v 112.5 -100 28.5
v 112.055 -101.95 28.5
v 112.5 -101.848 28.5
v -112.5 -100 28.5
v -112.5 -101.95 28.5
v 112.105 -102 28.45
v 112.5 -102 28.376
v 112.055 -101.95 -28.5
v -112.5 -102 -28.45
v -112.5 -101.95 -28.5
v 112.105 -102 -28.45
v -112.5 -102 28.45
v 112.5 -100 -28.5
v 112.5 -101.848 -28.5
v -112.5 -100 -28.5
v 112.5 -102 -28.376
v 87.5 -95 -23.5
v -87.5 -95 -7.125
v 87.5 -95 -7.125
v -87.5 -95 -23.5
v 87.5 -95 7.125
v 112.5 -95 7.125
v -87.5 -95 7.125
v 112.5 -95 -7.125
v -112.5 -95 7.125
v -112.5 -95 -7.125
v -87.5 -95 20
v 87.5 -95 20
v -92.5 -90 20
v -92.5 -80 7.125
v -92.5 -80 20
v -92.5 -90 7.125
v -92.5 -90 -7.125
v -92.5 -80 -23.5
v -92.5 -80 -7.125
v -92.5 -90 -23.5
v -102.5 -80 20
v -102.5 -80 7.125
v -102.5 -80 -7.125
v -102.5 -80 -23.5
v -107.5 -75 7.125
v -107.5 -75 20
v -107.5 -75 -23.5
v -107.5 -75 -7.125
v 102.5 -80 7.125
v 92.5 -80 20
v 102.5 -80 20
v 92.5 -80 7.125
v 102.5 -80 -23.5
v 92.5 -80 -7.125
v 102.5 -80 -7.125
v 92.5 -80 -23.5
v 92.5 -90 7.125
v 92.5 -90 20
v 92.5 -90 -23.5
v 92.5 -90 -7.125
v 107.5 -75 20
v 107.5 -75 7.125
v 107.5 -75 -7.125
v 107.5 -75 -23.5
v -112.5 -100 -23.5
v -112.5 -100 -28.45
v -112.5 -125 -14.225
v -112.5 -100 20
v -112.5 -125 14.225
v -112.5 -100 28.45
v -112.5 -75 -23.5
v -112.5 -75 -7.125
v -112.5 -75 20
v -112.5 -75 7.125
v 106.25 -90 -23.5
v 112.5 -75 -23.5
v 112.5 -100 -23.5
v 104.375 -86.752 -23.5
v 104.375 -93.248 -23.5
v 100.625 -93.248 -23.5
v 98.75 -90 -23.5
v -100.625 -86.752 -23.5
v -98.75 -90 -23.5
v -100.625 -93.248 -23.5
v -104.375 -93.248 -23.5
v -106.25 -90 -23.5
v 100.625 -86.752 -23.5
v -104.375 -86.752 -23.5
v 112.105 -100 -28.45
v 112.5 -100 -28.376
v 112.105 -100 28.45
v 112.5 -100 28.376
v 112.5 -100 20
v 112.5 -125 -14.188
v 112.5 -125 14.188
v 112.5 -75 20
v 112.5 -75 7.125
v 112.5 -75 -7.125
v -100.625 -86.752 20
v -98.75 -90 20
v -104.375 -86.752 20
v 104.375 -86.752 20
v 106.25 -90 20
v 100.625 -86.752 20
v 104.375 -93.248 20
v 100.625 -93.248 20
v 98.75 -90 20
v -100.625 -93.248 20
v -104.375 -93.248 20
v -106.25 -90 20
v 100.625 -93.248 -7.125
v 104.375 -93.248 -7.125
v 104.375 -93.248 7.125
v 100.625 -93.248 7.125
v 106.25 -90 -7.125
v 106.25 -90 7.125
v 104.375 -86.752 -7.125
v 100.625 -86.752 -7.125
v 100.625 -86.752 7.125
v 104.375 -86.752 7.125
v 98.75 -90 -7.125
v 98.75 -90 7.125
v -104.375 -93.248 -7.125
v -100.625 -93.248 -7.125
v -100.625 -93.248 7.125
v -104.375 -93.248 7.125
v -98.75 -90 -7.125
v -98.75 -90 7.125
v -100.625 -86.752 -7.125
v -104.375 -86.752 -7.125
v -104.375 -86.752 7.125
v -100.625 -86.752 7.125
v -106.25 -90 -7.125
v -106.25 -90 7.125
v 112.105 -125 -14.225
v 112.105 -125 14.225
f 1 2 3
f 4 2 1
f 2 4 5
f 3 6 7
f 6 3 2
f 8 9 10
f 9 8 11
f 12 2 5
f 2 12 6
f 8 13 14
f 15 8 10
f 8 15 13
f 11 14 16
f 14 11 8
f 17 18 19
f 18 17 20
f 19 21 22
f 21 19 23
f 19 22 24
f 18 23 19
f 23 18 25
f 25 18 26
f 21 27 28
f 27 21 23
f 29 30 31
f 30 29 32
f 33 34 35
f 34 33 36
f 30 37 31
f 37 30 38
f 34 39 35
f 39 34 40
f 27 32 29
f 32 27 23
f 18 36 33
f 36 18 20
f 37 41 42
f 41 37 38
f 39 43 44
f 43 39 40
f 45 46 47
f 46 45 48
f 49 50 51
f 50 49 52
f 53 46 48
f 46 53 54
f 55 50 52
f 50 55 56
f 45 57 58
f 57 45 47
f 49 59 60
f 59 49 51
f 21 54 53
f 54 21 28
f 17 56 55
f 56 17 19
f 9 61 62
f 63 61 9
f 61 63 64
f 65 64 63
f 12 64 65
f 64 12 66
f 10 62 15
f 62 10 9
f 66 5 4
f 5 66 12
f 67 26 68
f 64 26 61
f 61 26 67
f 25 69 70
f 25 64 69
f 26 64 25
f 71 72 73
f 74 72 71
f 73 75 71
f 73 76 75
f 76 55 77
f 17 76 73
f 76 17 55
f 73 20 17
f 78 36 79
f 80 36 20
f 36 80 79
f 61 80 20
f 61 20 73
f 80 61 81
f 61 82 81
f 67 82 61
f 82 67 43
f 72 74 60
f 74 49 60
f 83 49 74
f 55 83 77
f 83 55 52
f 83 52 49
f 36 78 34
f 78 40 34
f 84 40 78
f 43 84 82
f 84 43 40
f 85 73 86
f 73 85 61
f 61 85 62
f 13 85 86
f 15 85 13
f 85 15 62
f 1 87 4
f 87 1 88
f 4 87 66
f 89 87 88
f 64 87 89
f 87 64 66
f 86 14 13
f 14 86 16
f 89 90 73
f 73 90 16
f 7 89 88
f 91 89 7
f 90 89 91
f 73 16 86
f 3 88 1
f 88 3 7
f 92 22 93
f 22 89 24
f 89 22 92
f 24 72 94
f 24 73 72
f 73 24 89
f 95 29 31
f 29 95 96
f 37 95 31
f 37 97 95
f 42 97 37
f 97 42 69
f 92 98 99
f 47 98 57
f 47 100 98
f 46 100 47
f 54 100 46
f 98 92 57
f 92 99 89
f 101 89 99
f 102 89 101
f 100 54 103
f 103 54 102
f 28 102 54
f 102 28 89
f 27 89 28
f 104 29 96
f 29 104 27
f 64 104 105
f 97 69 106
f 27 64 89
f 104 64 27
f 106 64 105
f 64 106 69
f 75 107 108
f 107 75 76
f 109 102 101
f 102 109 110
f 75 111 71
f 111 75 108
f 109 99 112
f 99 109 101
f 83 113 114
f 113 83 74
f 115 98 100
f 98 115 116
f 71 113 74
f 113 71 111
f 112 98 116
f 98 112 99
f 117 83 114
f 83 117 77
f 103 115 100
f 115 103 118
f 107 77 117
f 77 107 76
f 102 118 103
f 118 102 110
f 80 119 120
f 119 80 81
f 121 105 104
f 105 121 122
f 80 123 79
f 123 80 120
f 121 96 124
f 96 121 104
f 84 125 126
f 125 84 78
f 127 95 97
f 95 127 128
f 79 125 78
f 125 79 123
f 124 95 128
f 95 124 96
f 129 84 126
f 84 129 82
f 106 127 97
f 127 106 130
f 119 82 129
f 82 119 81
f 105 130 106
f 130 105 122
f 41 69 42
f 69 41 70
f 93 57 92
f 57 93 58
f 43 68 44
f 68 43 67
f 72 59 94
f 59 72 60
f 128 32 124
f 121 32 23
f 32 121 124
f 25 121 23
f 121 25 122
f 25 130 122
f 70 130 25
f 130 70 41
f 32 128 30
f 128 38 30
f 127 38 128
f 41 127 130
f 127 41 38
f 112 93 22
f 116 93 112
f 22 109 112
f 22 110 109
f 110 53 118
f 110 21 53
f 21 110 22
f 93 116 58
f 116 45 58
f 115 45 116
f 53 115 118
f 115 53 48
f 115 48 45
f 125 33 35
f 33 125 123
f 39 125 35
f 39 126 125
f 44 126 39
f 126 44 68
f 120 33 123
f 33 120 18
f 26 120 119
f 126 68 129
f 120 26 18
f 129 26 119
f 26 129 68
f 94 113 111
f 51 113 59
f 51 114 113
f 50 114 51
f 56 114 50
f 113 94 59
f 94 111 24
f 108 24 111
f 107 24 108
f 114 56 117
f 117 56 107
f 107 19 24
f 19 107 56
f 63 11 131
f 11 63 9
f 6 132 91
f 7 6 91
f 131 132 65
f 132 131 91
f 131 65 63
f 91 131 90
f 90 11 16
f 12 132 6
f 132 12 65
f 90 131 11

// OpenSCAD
// file: frame-left.scad
/*
 * SPDX-FileCopyrightText: © 2023 Brian S. Stephan <bss@incorporeal.org>
 * SPDX-License-Identifier: GPL-3.0-or-later
 */

include <parameters.scad>
include <components.scad>

module base_left_frame(lower=false) {
	difference() {
		frame(lower=lower);
		// chop the right edge off
		side_chopper();
	}
}

module left_frame(lower=false) {
	difference() {
		base_left_frame(lower=lower);
		// connection holes to other frames
		frame_connection_holes();

		// cable routing hole
		frame_cable_routing_hole();

		// aux button holes
		translate([-35, 101.5, 0]) rotate([270, 0, 0]) aux_control_three_button_cluster();
		translate([-35, (frame_y/2)-neutrik_panel_thickness-4, 0]) frame_cutout();
		translate([-72, (frame_y/2)-neutrik_panel_thickness-4, 0]) frame_cutout();
		translate([2, (frame_y/2)-neutrik_panel_thickness-4, 0]) frame_cutout();

		// neutrix button hole
		translate([frame_center_to_neutrik, (frame_y/2)-neutrik_panel_thickness, 0])
			rotate([90, 0, 0]) neutrik_d_mount();
		translate([frame_center_to_neutrik, (frame_y/2)-neutrik_panel_thickness-4, 0])
			frame_cutout();
	}
}

left_frame();
// file: frame-piece-bottom-left-or-right.scad
/*
 * SPDX-FileCopyrightText: © 2024 Brian S. Stephan <bss@incorporeal.org>
 * SPDX-License-Identifier: GPL-3.0-or-later
 */

include <parameters.scad>
include <components.scad>
use <frame-left.scad>

module bottom_left_or_right_frame_piece(lower=false) {
	piece_width = panel_support_width+frame_wall+frame_mount_column_width;
	intersection() {
		left_frame(lower=lower);
		difference() {
			// include the whole bottom wall (including mount columns)
			translate([0, -(frame_y/2)+(piece_width/2), 0]) cube([frame_x, piece_width, frame_z], center=true);
			// ...minus the frame wall and lip on the left
			translate([-frame_x/2+frame_wall/2, 0, 0])
				cube([frame_wall, frame_y, frame_z], center=true);
			// ...minus a slot for the combining piece to go into
			cube([frame_x, frame_y-(panel_support_width+frame_wall)*2, frame_z/4], center=true);
		}
	}
}

bottom_left_or_right_frame_piece();
// file: frame-piece-bottom-left-or-right-extended.scad
/*
 * SPDX-FileCopyrightText: © 2024 Brian S. Stephan <bss@incorporeal.org>
 * SPDX-License-Identifier: GPL-3.0-or-later
 */

include <parameters.scad>
include <components.scad>
use <frame-piece-bottom-left-or-right.scad>

module bottom_piece_wall(lower=false) {
	// get a slice of the piece, to use it in extruding
	projection(cut=true) rotate([-90, 0, 0]) translate([0, frame_y/2-frame_bevel_height, 0])
		bottom_left_or_right_frame_piece(lower=lower);
}

module bottom_piece_extension(lower=false) {
	// combine the original with a shrunken piece to "pull" the wall out
	hull() {
		linear_extrude(height=frame_extension_y) scale([1, 0.5, 1]) bottom_piece_wall();
		linear_extrude(height=frame_bevel_height) bottom_piece_wall(lower=lower);
	}
}

module extended_bottom_left_or_right_frame_piece(lower=false) {
	bottom_left_or_right_frame_piece(lower=lower);
	translate([0, -frame_y/2+frame_bevel_height*2, 0]) rotate([90, 0, 0]) bottom_piece_extension(lower=lower);
}

extended_bottom_left_or_right_frame_piece();
// file: parameters.scad
/*
 * SPDX-FileCopyrightText: © 2023 Brian S. Stephan <bss@incorporeal.org>
 * SPDX-License-Identifier: GPL-3.0-or-later
 */

// adjustments
hole_tolerance = 0.15;

// M2
m2_screw_selftap_radius = 0.95;

// M3
m3_screw_selftap_radius = 1.3;

// M4
m4_bolt_radius = 2 + hole_tolerance;
m4_bolt_countersink_radius = 6.1 + hole_tolerance;
m4_bolt_hex_exterior_radius = 3.6 + hole_tolerance;

// 24mm button
small_button_radius = 12 + hole_tolerance;

// 30mm button
big_button_radius = 15 + hole_tolerance;

// JLF mount dimensions
lever_mount_x = 53;
lever_mount_y = 95;
lever_mount_z = 2;

// standard lever hole
lever_plate_hole = 12;

// korean lever hole
korean_lever_plate_hole = 17.6;

// case dimensions
// base frame box. reminder: top of inside (including mounts) is chopped by panel_z for plates
frame_x = 233;
frame_y = 208;
frame_z = 57;

// degree to which the extended frame pieces stick out from the end of the frame
frame_extension_x = 25;
frame_extension_y = 25;

// this sinks the bottom and top of the frame inward a bit, and is used to math out two shapes
// when creating the frame box / overhang panel
frame_bevel_height = 2;
overhang_panel_bevel_height = 1;

frame_center_to_neutrik = 70;

// depth of the "lip" of the frame that the top plate sets into/supports the overhang
frame_wall = 4;

// width of the column in the frame corners to support the hex bolt
frame_mount_column_width = 20;

// per neutrik (mm)
neutrik_panel_thickness = 3;

// top plate, which can either be the whole plate ("inset") or the mounting frame for a plate that overhangs
panel_x = frame_x - (frame_wall * 2);
panel_y = frame_y - (frame_wall * 2);
panel_z = 5;

// how much the top plate x/y is expanded to overhang the frame
// note that this is relative to the top plate (so the wall is added back)
panel_overhang_amount = 8.5;
overhang_panel_x = panel_x + (frame_wall * 2) + (panel_overhang_amount * 2);
overhang_panel_y = panel_y + (frame_wall * 2) + (panel_overhang_amount * 2);

panel_to_frame_point_x = (panel_x/2)-10;
panel_to_frame_point_y = (panel_y/2)-10;

// frame interior that supports the top plates
panel_support_width = 5;

// neutrik D screw holes
neutrik_d_screw_radius = 1.6 + hole_tolerance;
neutrik_d_radius = 12 + hole_tolerance;

// GX 16 holes
gx16_radius = 7.8 + hole_tolerance;

// additional button radius for decorative panels, etc.
decorative_radius_scale = 1.75;
jumbo_decorative_radius_scale = 2;
// main file
/*
 * SPDX-FileCopyrightText: © 2023 Brian S. Stephan <bss@incorporeal.org>
 * SPDX-FileCopyrightText: © 2023 Luis Sebastián <buran@silosneeded.com>
 * SPDX-License-Identifier: GPL-3.0-or-later
 */

include <parameters.scad>
include <components.scad>
use <frame-piece-bottom-left-or-right-extended.scad>

extended_bottom_left_or_right_frame_piece(lower=true);
